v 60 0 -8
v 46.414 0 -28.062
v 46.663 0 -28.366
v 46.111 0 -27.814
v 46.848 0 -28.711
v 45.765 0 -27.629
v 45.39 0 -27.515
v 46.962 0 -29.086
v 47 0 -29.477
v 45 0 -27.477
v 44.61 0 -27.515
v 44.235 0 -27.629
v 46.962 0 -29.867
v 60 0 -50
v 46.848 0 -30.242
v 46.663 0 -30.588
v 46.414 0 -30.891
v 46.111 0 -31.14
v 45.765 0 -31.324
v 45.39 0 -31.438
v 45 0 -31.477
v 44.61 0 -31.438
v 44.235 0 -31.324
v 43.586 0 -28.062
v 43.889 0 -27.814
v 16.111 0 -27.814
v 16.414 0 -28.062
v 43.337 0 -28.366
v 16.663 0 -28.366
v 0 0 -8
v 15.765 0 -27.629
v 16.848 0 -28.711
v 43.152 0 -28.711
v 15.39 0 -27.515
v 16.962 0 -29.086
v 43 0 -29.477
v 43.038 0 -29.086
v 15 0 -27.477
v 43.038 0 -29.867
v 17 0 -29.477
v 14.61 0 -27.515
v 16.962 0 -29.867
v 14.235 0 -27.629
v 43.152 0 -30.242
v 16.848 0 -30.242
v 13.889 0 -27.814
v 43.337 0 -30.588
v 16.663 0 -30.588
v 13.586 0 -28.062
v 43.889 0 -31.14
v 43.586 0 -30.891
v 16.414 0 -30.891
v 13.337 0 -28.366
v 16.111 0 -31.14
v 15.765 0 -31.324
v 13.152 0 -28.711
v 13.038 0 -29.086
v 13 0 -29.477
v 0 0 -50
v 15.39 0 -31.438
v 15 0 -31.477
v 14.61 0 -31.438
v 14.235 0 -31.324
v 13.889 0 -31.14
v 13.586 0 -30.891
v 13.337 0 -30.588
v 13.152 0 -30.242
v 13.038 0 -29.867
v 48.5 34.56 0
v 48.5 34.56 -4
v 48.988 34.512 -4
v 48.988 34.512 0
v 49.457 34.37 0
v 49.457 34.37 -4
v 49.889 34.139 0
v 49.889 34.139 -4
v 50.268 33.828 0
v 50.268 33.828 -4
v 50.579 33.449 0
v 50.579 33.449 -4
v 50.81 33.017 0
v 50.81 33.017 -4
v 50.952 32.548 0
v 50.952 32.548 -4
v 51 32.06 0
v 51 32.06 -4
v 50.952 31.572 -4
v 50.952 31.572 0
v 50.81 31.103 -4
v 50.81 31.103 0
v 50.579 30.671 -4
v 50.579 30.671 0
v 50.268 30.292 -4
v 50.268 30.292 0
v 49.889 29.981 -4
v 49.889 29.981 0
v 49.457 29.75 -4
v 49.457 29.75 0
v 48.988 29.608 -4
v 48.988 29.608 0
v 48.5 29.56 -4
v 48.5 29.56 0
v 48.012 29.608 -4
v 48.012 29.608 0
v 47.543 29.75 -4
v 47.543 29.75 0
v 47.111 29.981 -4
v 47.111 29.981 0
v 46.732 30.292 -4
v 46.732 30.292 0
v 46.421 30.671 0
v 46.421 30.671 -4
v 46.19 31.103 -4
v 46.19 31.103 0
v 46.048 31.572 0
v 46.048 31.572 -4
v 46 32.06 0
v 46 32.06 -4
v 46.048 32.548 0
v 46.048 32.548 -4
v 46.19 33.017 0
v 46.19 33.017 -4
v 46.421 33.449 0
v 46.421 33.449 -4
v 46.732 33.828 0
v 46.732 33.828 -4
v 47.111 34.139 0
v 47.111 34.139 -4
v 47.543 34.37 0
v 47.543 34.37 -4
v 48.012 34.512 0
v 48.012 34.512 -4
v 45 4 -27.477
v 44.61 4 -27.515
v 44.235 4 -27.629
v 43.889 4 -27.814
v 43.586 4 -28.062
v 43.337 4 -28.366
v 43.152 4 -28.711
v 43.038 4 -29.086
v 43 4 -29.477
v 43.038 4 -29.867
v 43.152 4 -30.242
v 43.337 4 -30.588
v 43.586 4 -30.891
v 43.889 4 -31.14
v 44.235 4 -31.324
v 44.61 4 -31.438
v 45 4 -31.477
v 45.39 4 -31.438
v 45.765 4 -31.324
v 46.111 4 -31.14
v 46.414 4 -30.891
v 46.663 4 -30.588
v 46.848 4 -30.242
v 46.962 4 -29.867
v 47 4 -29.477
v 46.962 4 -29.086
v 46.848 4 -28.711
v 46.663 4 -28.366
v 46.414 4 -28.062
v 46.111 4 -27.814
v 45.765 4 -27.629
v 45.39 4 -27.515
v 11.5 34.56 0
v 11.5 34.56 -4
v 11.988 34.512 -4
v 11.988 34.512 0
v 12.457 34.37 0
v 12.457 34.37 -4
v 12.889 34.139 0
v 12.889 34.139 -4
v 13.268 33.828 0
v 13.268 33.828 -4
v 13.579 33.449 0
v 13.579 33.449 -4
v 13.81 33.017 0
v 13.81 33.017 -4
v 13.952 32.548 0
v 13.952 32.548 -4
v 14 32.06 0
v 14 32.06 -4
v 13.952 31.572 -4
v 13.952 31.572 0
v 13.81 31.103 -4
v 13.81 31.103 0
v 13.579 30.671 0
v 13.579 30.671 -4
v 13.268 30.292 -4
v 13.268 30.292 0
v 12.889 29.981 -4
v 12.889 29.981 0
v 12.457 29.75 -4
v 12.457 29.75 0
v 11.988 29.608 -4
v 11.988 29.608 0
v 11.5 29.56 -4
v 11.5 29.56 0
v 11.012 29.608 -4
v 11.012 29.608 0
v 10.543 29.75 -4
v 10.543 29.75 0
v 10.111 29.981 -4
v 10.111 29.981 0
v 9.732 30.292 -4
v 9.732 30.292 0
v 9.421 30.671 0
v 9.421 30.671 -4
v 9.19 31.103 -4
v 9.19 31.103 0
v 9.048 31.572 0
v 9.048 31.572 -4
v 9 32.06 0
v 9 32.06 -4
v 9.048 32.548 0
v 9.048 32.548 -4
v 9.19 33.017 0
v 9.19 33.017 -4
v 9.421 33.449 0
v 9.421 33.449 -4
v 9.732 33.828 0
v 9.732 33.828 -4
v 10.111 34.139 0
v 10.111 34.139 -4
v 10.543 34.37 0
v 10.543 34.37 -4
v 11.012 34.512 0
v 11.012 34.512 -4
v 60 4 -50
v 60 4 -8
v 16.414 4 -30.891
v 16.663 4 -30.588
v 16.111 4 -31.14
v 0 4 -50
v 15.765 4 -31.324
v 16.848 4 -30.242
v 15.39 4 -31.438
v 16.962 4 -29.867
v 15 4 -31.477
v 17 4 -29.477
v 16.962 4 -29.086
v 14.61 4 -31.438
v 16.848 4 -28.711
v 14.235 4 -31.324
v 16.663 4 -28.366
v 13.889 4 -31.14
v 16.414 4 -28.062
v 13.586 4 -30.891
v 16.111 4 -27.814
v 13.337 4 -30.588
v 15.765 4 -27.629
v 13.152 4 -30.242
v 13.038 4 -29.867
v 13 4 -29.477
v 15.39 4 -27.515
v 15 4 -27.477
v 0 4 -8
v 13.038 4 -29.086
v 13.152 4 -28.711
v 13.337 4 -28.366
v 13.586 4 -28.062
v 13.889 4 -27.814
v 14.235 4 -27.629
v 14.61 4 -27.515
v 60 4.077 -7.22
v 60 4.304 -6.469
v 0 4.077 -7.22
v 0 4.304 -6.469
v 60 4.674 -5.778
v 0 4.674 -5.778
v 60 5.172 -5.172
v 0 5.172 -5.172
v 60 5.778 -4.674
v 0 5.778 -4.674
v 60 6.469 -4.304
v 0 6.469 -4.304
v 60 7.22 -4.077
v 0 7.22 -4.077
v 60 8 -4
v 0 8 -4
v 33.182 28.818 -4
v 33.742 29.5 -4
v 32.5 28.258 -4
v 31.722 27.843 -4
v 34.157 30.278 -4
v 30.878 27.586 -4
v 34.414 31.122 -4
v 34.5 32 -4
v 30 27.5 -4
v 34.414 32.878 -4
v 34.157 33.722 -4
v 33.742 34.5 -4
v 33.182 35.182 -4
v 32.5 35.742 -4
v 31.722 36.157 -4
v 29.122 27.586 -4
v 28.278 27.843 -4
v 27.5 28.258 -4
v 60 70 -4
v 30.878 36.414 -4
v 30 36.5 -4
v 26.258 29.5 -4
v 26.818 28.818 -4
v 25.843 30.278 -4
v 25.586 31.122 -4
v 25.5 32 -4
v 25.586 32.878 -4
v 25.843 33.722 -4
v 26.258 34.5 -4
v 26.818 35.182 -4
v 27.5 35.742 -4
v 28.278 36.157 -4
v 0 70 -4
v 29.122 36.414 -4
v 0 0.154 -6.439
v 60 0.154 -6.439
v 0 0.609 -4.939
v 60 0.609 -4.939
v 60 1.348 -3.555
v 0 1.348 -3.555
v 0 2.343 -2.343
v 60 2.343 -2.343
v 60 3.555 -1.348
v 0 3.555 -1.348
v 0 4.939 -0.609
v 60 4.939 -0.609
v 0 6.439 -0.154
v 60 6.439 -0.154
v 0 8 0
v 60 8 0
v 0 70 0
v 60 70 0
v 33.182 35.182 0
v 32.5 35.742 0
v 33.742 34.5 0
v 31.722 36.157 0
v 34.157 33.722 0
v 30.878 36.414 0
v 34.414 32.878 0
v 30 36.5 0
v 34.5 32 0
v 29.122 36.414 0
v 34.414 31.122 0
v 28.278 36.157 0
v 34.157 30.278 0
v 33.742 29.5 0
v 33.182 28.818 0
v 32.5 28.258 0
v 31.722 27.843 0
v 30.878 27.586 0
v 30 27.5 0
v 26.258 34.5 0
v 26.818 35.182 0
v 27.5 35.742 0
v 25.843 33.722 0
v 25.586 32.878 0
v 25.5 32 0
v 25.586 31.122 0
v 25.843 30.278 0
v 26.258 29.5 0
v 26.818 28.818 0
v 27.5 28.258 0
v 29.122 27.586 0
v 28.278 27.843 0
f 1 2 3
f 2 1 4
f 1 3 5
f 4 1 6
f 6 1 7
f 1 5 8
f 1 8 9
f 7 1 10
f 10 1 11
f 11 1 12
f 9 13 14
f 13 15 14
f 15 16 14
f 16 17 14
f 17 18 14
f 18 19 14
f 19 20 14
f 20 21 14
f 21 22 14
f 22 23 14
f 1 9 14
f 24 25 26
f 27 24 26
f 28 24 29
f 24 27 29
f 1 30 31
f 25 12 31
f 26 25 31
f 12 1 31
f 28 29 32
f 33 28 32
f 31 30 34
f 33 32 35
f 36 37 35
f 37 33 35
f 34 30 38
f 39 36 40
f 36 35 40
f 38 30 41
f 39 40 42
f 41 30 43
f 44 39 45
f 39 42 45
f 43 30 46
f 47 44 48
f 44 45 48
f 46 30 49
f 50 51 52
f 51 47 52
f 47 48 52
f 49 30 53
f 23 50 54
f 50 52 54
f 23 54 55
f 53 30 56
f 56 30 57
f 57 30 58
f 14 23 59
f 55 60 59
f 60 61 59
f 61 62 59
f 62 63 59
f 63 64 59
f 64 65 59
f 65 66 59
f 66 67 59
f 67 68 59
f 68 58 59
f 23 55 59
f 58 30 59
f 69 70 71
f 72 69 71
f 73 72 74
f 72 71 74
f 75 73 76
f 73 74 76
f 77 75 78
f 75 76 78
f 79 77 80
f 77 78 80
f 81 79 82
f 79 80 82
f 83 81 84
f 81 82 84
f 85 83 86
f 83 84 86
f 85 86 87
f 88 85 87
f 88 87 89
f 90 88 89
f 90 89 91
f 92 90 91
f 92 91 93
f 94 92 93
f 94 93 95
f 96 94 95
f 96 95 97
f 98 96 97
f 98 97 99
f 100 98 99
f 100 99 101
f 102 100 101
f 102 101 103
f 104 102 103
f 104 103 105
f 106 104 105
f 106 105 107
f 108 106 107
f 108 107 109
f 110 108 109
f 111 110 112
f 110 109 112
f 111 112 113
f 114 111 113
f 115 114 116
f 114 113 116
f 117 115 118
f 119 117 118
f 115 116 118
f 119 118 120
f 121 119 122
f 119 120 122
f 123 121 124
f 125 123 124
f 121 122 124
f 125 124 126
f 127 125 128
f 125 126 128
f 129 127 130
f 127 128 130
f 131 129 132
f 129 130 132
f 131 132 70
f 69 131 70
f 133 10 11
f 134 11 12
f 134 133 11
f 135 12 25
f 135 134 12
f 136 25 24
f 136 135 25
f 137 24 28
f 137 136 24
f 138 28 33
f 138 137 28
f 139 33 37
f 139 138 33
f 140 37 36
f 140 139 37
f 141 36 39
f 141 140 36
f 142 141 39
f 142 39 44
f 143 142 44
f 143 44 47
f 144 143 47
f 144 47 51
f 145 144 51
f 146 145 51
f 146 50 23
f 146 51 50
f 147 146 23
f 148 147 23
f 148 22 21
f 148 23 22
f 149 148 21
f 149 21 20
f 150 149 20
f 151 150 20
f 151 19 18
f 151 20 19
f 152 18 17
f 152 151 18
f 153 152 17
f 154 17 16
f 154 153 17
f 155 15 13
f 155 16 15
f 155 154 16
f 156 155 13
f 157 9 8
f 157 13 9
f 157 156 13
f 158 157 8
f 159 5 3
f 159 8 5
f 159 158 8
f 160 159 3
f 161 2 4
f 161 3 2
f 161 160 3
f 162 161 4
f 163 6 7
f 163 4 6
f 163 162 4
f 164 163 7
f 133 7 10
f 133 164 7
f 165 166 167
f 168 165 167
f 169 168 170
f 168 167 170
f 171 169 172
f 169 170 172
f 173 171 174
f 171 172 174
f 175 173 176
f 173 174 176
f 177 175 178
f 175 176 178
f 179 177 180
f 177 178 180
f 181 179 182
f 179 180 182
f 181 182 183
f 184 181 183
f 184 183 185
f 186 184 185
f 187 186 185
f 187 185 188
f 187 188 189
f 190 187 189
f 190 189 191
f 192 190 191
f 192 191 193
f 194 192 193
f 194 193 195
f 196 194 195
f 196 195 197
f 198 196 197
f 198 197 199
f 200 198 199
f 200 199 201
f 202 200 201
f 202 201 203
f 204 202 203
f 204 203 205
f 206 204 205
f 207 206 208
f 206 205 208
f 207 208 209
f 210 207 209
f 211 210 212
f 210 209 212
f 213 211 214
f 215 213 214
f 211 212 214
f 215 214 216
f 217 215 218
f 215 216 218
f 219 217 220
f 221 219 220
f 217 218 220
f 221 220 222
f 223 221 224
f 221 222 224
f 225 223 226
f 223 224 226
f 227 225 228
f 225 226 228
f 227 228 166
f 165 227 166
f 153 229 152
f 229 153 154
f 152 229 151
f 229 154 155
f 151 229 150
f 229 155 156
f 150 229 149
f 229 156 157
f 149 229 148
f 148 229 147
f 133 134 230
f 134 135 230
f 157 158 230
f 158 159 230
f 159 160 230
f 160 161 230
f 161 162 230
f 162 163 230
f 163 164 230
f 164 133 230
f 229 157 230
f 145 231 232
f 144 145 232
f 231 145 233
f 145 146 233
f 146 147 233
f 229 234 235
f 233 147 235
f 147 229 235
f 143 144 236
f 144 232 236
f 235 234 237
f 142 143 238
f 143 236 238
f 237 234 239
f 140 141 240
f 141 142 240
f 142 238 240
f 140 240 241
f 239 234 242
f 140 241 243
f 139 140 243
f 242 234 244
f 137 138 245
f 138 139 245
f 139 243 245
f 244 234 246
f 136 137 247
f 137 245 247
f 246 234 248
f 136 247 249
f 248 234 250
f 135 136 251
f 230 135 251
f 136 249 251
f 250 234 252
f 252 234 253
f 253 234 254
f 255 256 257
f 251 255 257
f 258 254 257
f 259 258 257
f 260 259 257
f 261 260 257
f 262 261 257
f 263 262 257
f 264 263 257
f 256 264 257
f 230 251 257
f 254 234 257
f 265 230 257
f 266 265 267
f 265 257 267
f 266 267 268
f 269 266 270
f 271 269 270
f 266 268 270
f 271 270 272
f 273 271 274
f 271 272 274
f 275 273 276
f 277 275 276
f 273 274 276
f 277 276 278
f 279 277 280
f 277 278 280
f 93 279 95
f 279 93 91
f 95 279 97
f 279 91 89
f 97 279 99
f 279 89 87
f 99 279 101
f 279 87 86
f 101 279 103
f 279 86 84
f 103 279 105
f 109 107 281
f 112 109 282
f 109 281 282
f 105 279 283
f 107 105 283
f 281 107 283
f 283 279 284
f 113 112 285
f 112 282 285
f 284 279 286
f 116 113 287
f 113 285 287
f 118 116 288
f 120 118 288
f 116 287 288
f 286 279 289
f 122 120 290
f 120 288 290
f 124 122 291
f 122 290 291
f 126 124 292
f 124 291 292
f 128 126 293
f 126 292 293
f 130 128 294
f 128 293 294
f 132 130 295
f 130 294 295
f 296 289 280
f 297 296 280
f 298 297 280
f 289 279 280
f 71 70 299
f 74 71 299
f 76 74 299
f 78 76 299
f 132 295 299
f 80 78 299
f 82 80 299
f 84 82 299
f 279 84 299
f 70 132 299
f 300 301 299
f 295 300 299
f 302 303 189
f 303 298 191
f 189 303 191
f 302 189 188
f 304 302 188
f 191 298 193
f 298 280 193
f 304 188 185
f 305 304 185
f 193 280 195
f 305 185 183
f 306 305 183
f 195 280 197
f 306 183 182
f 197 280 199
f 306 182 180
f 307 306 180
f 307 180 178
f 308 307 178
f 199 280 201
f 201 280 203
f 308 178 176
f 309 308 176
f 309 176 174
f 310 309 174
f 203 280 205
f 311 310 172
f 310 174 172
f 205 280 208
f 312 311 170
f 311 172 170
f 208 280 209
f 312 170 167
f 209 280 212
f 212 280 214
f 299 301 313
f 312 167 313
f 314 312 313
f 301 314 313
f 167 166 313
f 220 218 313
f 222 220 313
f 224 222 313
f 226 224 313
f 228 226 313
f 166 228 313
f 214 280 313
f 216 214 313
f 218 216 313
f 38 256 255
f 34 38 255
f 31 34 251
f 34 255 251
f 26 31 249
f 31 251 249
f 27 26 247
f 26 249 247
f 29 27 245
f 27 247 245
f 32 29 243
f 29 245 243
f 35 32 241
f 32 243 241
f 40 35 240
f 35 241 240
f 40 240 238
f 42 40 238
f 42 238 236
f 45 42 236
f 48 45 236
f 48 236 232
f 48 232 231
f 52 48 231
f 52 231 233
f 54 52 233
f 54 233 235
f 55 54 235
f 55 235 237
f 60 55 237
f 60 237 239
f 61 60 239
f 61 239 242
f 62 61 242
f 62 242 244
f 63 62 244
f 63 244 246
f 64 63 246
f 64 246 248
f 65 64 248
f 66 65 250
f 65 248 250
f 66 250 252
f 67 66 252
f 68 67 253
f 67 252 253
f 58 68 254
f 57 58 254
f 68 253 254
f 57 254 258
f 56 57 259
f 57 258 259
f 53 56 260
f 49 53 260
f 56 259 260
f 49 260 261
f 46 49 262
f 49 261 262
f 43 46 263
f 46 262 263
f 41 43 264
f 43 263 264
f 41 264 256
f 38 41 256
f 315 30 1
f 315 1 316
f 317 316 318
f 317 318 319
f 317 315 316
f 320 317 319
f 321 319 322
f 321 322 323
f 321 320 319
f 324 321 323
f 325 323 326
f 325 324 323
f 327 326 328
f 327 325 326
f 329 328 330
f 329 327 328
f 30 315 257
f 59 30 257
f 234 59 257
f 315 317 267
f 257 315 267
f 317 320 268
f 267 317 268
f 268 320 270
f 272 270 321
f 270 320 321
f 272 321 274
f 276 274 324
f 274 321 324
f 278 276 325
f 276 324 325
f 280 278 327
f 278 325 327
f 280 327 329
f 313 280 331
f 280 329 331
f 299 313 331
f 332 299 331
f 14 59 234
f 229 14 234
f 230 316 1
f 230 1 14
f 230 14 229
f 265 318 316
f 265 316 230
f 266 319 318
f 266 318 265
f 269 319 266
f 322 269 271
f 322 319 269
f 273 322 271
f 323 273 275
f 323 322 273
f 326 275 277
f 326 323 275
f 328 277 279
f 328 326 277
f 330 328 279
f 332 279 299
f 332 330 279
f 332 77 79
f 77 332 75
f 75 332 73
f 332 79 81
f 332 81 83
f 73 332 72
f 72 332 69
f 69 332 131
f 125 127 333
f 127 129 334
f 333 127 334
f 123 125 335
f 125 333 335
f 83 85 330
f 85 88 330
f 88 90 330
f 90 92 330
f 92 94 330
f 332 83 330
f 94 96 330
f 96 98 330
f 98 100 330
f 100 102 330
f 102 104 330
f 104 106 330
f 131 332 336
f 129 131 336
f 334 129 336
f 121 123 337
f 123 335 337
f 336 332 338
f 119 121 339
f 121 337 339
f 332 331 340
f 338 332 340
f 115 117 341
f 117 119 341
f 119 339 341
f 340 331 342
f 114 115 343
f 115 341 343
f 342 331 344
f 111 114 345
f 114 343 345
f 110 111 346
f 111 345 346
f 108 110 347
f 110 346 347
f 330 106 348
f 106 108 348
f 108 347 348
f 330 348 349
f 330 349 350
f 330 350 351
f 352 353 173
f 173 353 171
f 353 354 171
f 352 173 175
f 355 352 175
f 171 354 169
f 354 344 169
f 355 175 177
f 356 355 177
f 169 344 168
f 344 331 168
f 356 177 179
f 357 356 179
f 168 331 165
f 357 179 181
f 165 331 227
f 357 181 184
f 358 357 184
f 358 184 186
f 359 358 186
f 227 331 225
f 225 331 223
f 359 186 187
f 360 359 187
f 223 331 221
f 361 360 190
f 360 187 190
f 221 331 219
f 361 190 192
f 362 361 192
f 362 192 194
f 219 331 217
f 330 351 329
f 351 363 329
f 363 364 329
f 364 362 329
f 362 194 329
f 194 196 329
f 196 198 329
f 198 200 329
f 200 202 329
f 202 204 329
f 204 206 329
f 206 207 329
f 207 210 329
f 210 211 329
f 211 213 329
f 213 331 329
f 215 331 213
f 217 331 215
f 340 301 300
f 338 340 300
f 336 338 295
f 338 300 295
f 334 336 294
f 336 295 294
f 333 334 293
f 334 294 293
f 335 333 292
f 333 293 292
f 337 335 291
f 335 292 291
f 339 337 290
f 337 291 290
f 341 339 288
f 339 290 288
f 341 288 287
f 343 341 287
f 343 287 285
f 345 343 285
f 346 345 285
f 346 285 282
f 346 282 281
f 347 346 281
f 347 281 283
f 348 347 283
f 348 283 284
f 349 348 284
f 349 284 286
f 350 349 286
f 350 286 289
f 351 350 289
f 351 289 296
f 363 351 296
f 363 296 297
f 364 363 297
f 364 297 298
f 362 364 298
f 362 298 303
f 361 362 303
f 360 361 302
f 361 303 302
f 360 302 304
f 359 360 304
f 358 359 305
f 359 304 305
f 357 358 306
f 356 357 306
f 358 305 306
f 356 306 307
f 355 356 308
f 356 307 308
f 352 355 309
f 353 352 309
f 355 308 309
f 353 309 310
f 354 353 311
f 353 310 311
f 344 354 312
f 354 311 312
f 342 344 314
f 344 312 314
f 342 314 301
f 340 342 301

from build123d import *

# Parameters (mm, degrees)
BOSS_EXTRUDE1_DEPTH    = 60
CONVERT_SOLID1_DEPTH   = 60
CONVERT_SOLID1_2_DEPTH = 60
SKETCH7_R              = 2
CUT_EXTRUDE2_DEPTH     = 60
SKETCH10_R             = 4.5
CUT_EXTRUDE3_DEPTH     = 10
SKETCH12_R             = 2.5
CUT_EXTRUDE4_DEPTH     = 10


# Read off the part's stored shape, not the designer's step: Convert-Solid1
with BuildPart() as part:
    # Sketch2 → Boss-Extrude1 (new body)
    with BuildSketch(Plane(origin=(0, 0, 0), x_dir=(0, 0, -1), z_dir=(1, 0, 0))):
        Polygon((0, 70), (0, 0), (50, 0), (50, 4), (4, 4), (4, 70), align=None)
    extrude(amount=BOSS_EXTRUDE1_DEPTH)

    # Convert-Solid1 outline → Convert-Solid1 (cut)
    with BuildSketch(Plane.YZ):
        with BuildLine():
            ThreePointArc((0, -8), (2.343145751, -2.343145751), (8, 0))
            Line((8, 0), (0, 0))
            Line((0, 0), (0, -8))
        make_face()
    extrude(amount=CONVERT_SOLID1_DEPTH, mode=Mode.SUBTRACT)

    # Convert-Solid1 2 outline → Convert-Solid1 2 (add)
    with BuildSketch(Plane.YZ):
        with BuildLine():
            ThreePointArc((4, -8), (5.171572875, -5.171572875), (8, -4))
            Line((8, -4), (4, -4))
            Line((4, -4), (4, -8))
        make_face()
    extrude(amount=CONVERT_SOLID1_2_DEPTH)

    # Sketch7 → Cut-Extrude2 (cut)
    with BuildSketch(Plane(origin=(0, 4, 0), x_dir=(1, 0, 0), z_dir=(0, 1, 0))):
        with Locations(Location((15, 29.476677551, 0), (0, 0, 270))):
            Circle(SKETCH7_R)
    cut_extrude2 = extrude(amount=-CUT_EXTRUDE2_DEPTH, mode=Mode.SUBTRACT)

    # Mirror1: Cut-Extrude2 across plane
    add(cut_extrude2.mirror(Plane.ZY.offset(-30)), mode=Mode.SUBTRACT)

    # Sketch10 → Cut-Extrude3 (cut)
    with BuildSketch(Plane(origin=(0, 0, -4), x_dir=(-1, 0, 0), z_dir=(0, 0, -1))):
        with Locations(Location((-30, 32, 0), (0, 0, 90))):
            Circle(SKETCH10_R)
    extrude(amount=-CUT_EXTRUDE3_DEPTH, mode=Mode.SUBTRACT)

    # Sketch12 → Cut-Extrude4 (cut)
    with BuildSketch(Plane(origin=(0, 0, -4), x_dir=(-1, 0, 0), z_dir=(0, 0, -1))):
        with Locations(Location((-48.499902666, 32.060011256, 0), (0, 0, 90))):
            Circle(SKETCH12_R)
        with Locations(Location((-11.5, 32.060011256, 0), (0, 0, 90))):
            Circle(SKETCH12_R)
    extrude(amount=-CUT_EXTRUDE4_DEPTH, mode=Mode.SUBTRACT)


solid = part.part
